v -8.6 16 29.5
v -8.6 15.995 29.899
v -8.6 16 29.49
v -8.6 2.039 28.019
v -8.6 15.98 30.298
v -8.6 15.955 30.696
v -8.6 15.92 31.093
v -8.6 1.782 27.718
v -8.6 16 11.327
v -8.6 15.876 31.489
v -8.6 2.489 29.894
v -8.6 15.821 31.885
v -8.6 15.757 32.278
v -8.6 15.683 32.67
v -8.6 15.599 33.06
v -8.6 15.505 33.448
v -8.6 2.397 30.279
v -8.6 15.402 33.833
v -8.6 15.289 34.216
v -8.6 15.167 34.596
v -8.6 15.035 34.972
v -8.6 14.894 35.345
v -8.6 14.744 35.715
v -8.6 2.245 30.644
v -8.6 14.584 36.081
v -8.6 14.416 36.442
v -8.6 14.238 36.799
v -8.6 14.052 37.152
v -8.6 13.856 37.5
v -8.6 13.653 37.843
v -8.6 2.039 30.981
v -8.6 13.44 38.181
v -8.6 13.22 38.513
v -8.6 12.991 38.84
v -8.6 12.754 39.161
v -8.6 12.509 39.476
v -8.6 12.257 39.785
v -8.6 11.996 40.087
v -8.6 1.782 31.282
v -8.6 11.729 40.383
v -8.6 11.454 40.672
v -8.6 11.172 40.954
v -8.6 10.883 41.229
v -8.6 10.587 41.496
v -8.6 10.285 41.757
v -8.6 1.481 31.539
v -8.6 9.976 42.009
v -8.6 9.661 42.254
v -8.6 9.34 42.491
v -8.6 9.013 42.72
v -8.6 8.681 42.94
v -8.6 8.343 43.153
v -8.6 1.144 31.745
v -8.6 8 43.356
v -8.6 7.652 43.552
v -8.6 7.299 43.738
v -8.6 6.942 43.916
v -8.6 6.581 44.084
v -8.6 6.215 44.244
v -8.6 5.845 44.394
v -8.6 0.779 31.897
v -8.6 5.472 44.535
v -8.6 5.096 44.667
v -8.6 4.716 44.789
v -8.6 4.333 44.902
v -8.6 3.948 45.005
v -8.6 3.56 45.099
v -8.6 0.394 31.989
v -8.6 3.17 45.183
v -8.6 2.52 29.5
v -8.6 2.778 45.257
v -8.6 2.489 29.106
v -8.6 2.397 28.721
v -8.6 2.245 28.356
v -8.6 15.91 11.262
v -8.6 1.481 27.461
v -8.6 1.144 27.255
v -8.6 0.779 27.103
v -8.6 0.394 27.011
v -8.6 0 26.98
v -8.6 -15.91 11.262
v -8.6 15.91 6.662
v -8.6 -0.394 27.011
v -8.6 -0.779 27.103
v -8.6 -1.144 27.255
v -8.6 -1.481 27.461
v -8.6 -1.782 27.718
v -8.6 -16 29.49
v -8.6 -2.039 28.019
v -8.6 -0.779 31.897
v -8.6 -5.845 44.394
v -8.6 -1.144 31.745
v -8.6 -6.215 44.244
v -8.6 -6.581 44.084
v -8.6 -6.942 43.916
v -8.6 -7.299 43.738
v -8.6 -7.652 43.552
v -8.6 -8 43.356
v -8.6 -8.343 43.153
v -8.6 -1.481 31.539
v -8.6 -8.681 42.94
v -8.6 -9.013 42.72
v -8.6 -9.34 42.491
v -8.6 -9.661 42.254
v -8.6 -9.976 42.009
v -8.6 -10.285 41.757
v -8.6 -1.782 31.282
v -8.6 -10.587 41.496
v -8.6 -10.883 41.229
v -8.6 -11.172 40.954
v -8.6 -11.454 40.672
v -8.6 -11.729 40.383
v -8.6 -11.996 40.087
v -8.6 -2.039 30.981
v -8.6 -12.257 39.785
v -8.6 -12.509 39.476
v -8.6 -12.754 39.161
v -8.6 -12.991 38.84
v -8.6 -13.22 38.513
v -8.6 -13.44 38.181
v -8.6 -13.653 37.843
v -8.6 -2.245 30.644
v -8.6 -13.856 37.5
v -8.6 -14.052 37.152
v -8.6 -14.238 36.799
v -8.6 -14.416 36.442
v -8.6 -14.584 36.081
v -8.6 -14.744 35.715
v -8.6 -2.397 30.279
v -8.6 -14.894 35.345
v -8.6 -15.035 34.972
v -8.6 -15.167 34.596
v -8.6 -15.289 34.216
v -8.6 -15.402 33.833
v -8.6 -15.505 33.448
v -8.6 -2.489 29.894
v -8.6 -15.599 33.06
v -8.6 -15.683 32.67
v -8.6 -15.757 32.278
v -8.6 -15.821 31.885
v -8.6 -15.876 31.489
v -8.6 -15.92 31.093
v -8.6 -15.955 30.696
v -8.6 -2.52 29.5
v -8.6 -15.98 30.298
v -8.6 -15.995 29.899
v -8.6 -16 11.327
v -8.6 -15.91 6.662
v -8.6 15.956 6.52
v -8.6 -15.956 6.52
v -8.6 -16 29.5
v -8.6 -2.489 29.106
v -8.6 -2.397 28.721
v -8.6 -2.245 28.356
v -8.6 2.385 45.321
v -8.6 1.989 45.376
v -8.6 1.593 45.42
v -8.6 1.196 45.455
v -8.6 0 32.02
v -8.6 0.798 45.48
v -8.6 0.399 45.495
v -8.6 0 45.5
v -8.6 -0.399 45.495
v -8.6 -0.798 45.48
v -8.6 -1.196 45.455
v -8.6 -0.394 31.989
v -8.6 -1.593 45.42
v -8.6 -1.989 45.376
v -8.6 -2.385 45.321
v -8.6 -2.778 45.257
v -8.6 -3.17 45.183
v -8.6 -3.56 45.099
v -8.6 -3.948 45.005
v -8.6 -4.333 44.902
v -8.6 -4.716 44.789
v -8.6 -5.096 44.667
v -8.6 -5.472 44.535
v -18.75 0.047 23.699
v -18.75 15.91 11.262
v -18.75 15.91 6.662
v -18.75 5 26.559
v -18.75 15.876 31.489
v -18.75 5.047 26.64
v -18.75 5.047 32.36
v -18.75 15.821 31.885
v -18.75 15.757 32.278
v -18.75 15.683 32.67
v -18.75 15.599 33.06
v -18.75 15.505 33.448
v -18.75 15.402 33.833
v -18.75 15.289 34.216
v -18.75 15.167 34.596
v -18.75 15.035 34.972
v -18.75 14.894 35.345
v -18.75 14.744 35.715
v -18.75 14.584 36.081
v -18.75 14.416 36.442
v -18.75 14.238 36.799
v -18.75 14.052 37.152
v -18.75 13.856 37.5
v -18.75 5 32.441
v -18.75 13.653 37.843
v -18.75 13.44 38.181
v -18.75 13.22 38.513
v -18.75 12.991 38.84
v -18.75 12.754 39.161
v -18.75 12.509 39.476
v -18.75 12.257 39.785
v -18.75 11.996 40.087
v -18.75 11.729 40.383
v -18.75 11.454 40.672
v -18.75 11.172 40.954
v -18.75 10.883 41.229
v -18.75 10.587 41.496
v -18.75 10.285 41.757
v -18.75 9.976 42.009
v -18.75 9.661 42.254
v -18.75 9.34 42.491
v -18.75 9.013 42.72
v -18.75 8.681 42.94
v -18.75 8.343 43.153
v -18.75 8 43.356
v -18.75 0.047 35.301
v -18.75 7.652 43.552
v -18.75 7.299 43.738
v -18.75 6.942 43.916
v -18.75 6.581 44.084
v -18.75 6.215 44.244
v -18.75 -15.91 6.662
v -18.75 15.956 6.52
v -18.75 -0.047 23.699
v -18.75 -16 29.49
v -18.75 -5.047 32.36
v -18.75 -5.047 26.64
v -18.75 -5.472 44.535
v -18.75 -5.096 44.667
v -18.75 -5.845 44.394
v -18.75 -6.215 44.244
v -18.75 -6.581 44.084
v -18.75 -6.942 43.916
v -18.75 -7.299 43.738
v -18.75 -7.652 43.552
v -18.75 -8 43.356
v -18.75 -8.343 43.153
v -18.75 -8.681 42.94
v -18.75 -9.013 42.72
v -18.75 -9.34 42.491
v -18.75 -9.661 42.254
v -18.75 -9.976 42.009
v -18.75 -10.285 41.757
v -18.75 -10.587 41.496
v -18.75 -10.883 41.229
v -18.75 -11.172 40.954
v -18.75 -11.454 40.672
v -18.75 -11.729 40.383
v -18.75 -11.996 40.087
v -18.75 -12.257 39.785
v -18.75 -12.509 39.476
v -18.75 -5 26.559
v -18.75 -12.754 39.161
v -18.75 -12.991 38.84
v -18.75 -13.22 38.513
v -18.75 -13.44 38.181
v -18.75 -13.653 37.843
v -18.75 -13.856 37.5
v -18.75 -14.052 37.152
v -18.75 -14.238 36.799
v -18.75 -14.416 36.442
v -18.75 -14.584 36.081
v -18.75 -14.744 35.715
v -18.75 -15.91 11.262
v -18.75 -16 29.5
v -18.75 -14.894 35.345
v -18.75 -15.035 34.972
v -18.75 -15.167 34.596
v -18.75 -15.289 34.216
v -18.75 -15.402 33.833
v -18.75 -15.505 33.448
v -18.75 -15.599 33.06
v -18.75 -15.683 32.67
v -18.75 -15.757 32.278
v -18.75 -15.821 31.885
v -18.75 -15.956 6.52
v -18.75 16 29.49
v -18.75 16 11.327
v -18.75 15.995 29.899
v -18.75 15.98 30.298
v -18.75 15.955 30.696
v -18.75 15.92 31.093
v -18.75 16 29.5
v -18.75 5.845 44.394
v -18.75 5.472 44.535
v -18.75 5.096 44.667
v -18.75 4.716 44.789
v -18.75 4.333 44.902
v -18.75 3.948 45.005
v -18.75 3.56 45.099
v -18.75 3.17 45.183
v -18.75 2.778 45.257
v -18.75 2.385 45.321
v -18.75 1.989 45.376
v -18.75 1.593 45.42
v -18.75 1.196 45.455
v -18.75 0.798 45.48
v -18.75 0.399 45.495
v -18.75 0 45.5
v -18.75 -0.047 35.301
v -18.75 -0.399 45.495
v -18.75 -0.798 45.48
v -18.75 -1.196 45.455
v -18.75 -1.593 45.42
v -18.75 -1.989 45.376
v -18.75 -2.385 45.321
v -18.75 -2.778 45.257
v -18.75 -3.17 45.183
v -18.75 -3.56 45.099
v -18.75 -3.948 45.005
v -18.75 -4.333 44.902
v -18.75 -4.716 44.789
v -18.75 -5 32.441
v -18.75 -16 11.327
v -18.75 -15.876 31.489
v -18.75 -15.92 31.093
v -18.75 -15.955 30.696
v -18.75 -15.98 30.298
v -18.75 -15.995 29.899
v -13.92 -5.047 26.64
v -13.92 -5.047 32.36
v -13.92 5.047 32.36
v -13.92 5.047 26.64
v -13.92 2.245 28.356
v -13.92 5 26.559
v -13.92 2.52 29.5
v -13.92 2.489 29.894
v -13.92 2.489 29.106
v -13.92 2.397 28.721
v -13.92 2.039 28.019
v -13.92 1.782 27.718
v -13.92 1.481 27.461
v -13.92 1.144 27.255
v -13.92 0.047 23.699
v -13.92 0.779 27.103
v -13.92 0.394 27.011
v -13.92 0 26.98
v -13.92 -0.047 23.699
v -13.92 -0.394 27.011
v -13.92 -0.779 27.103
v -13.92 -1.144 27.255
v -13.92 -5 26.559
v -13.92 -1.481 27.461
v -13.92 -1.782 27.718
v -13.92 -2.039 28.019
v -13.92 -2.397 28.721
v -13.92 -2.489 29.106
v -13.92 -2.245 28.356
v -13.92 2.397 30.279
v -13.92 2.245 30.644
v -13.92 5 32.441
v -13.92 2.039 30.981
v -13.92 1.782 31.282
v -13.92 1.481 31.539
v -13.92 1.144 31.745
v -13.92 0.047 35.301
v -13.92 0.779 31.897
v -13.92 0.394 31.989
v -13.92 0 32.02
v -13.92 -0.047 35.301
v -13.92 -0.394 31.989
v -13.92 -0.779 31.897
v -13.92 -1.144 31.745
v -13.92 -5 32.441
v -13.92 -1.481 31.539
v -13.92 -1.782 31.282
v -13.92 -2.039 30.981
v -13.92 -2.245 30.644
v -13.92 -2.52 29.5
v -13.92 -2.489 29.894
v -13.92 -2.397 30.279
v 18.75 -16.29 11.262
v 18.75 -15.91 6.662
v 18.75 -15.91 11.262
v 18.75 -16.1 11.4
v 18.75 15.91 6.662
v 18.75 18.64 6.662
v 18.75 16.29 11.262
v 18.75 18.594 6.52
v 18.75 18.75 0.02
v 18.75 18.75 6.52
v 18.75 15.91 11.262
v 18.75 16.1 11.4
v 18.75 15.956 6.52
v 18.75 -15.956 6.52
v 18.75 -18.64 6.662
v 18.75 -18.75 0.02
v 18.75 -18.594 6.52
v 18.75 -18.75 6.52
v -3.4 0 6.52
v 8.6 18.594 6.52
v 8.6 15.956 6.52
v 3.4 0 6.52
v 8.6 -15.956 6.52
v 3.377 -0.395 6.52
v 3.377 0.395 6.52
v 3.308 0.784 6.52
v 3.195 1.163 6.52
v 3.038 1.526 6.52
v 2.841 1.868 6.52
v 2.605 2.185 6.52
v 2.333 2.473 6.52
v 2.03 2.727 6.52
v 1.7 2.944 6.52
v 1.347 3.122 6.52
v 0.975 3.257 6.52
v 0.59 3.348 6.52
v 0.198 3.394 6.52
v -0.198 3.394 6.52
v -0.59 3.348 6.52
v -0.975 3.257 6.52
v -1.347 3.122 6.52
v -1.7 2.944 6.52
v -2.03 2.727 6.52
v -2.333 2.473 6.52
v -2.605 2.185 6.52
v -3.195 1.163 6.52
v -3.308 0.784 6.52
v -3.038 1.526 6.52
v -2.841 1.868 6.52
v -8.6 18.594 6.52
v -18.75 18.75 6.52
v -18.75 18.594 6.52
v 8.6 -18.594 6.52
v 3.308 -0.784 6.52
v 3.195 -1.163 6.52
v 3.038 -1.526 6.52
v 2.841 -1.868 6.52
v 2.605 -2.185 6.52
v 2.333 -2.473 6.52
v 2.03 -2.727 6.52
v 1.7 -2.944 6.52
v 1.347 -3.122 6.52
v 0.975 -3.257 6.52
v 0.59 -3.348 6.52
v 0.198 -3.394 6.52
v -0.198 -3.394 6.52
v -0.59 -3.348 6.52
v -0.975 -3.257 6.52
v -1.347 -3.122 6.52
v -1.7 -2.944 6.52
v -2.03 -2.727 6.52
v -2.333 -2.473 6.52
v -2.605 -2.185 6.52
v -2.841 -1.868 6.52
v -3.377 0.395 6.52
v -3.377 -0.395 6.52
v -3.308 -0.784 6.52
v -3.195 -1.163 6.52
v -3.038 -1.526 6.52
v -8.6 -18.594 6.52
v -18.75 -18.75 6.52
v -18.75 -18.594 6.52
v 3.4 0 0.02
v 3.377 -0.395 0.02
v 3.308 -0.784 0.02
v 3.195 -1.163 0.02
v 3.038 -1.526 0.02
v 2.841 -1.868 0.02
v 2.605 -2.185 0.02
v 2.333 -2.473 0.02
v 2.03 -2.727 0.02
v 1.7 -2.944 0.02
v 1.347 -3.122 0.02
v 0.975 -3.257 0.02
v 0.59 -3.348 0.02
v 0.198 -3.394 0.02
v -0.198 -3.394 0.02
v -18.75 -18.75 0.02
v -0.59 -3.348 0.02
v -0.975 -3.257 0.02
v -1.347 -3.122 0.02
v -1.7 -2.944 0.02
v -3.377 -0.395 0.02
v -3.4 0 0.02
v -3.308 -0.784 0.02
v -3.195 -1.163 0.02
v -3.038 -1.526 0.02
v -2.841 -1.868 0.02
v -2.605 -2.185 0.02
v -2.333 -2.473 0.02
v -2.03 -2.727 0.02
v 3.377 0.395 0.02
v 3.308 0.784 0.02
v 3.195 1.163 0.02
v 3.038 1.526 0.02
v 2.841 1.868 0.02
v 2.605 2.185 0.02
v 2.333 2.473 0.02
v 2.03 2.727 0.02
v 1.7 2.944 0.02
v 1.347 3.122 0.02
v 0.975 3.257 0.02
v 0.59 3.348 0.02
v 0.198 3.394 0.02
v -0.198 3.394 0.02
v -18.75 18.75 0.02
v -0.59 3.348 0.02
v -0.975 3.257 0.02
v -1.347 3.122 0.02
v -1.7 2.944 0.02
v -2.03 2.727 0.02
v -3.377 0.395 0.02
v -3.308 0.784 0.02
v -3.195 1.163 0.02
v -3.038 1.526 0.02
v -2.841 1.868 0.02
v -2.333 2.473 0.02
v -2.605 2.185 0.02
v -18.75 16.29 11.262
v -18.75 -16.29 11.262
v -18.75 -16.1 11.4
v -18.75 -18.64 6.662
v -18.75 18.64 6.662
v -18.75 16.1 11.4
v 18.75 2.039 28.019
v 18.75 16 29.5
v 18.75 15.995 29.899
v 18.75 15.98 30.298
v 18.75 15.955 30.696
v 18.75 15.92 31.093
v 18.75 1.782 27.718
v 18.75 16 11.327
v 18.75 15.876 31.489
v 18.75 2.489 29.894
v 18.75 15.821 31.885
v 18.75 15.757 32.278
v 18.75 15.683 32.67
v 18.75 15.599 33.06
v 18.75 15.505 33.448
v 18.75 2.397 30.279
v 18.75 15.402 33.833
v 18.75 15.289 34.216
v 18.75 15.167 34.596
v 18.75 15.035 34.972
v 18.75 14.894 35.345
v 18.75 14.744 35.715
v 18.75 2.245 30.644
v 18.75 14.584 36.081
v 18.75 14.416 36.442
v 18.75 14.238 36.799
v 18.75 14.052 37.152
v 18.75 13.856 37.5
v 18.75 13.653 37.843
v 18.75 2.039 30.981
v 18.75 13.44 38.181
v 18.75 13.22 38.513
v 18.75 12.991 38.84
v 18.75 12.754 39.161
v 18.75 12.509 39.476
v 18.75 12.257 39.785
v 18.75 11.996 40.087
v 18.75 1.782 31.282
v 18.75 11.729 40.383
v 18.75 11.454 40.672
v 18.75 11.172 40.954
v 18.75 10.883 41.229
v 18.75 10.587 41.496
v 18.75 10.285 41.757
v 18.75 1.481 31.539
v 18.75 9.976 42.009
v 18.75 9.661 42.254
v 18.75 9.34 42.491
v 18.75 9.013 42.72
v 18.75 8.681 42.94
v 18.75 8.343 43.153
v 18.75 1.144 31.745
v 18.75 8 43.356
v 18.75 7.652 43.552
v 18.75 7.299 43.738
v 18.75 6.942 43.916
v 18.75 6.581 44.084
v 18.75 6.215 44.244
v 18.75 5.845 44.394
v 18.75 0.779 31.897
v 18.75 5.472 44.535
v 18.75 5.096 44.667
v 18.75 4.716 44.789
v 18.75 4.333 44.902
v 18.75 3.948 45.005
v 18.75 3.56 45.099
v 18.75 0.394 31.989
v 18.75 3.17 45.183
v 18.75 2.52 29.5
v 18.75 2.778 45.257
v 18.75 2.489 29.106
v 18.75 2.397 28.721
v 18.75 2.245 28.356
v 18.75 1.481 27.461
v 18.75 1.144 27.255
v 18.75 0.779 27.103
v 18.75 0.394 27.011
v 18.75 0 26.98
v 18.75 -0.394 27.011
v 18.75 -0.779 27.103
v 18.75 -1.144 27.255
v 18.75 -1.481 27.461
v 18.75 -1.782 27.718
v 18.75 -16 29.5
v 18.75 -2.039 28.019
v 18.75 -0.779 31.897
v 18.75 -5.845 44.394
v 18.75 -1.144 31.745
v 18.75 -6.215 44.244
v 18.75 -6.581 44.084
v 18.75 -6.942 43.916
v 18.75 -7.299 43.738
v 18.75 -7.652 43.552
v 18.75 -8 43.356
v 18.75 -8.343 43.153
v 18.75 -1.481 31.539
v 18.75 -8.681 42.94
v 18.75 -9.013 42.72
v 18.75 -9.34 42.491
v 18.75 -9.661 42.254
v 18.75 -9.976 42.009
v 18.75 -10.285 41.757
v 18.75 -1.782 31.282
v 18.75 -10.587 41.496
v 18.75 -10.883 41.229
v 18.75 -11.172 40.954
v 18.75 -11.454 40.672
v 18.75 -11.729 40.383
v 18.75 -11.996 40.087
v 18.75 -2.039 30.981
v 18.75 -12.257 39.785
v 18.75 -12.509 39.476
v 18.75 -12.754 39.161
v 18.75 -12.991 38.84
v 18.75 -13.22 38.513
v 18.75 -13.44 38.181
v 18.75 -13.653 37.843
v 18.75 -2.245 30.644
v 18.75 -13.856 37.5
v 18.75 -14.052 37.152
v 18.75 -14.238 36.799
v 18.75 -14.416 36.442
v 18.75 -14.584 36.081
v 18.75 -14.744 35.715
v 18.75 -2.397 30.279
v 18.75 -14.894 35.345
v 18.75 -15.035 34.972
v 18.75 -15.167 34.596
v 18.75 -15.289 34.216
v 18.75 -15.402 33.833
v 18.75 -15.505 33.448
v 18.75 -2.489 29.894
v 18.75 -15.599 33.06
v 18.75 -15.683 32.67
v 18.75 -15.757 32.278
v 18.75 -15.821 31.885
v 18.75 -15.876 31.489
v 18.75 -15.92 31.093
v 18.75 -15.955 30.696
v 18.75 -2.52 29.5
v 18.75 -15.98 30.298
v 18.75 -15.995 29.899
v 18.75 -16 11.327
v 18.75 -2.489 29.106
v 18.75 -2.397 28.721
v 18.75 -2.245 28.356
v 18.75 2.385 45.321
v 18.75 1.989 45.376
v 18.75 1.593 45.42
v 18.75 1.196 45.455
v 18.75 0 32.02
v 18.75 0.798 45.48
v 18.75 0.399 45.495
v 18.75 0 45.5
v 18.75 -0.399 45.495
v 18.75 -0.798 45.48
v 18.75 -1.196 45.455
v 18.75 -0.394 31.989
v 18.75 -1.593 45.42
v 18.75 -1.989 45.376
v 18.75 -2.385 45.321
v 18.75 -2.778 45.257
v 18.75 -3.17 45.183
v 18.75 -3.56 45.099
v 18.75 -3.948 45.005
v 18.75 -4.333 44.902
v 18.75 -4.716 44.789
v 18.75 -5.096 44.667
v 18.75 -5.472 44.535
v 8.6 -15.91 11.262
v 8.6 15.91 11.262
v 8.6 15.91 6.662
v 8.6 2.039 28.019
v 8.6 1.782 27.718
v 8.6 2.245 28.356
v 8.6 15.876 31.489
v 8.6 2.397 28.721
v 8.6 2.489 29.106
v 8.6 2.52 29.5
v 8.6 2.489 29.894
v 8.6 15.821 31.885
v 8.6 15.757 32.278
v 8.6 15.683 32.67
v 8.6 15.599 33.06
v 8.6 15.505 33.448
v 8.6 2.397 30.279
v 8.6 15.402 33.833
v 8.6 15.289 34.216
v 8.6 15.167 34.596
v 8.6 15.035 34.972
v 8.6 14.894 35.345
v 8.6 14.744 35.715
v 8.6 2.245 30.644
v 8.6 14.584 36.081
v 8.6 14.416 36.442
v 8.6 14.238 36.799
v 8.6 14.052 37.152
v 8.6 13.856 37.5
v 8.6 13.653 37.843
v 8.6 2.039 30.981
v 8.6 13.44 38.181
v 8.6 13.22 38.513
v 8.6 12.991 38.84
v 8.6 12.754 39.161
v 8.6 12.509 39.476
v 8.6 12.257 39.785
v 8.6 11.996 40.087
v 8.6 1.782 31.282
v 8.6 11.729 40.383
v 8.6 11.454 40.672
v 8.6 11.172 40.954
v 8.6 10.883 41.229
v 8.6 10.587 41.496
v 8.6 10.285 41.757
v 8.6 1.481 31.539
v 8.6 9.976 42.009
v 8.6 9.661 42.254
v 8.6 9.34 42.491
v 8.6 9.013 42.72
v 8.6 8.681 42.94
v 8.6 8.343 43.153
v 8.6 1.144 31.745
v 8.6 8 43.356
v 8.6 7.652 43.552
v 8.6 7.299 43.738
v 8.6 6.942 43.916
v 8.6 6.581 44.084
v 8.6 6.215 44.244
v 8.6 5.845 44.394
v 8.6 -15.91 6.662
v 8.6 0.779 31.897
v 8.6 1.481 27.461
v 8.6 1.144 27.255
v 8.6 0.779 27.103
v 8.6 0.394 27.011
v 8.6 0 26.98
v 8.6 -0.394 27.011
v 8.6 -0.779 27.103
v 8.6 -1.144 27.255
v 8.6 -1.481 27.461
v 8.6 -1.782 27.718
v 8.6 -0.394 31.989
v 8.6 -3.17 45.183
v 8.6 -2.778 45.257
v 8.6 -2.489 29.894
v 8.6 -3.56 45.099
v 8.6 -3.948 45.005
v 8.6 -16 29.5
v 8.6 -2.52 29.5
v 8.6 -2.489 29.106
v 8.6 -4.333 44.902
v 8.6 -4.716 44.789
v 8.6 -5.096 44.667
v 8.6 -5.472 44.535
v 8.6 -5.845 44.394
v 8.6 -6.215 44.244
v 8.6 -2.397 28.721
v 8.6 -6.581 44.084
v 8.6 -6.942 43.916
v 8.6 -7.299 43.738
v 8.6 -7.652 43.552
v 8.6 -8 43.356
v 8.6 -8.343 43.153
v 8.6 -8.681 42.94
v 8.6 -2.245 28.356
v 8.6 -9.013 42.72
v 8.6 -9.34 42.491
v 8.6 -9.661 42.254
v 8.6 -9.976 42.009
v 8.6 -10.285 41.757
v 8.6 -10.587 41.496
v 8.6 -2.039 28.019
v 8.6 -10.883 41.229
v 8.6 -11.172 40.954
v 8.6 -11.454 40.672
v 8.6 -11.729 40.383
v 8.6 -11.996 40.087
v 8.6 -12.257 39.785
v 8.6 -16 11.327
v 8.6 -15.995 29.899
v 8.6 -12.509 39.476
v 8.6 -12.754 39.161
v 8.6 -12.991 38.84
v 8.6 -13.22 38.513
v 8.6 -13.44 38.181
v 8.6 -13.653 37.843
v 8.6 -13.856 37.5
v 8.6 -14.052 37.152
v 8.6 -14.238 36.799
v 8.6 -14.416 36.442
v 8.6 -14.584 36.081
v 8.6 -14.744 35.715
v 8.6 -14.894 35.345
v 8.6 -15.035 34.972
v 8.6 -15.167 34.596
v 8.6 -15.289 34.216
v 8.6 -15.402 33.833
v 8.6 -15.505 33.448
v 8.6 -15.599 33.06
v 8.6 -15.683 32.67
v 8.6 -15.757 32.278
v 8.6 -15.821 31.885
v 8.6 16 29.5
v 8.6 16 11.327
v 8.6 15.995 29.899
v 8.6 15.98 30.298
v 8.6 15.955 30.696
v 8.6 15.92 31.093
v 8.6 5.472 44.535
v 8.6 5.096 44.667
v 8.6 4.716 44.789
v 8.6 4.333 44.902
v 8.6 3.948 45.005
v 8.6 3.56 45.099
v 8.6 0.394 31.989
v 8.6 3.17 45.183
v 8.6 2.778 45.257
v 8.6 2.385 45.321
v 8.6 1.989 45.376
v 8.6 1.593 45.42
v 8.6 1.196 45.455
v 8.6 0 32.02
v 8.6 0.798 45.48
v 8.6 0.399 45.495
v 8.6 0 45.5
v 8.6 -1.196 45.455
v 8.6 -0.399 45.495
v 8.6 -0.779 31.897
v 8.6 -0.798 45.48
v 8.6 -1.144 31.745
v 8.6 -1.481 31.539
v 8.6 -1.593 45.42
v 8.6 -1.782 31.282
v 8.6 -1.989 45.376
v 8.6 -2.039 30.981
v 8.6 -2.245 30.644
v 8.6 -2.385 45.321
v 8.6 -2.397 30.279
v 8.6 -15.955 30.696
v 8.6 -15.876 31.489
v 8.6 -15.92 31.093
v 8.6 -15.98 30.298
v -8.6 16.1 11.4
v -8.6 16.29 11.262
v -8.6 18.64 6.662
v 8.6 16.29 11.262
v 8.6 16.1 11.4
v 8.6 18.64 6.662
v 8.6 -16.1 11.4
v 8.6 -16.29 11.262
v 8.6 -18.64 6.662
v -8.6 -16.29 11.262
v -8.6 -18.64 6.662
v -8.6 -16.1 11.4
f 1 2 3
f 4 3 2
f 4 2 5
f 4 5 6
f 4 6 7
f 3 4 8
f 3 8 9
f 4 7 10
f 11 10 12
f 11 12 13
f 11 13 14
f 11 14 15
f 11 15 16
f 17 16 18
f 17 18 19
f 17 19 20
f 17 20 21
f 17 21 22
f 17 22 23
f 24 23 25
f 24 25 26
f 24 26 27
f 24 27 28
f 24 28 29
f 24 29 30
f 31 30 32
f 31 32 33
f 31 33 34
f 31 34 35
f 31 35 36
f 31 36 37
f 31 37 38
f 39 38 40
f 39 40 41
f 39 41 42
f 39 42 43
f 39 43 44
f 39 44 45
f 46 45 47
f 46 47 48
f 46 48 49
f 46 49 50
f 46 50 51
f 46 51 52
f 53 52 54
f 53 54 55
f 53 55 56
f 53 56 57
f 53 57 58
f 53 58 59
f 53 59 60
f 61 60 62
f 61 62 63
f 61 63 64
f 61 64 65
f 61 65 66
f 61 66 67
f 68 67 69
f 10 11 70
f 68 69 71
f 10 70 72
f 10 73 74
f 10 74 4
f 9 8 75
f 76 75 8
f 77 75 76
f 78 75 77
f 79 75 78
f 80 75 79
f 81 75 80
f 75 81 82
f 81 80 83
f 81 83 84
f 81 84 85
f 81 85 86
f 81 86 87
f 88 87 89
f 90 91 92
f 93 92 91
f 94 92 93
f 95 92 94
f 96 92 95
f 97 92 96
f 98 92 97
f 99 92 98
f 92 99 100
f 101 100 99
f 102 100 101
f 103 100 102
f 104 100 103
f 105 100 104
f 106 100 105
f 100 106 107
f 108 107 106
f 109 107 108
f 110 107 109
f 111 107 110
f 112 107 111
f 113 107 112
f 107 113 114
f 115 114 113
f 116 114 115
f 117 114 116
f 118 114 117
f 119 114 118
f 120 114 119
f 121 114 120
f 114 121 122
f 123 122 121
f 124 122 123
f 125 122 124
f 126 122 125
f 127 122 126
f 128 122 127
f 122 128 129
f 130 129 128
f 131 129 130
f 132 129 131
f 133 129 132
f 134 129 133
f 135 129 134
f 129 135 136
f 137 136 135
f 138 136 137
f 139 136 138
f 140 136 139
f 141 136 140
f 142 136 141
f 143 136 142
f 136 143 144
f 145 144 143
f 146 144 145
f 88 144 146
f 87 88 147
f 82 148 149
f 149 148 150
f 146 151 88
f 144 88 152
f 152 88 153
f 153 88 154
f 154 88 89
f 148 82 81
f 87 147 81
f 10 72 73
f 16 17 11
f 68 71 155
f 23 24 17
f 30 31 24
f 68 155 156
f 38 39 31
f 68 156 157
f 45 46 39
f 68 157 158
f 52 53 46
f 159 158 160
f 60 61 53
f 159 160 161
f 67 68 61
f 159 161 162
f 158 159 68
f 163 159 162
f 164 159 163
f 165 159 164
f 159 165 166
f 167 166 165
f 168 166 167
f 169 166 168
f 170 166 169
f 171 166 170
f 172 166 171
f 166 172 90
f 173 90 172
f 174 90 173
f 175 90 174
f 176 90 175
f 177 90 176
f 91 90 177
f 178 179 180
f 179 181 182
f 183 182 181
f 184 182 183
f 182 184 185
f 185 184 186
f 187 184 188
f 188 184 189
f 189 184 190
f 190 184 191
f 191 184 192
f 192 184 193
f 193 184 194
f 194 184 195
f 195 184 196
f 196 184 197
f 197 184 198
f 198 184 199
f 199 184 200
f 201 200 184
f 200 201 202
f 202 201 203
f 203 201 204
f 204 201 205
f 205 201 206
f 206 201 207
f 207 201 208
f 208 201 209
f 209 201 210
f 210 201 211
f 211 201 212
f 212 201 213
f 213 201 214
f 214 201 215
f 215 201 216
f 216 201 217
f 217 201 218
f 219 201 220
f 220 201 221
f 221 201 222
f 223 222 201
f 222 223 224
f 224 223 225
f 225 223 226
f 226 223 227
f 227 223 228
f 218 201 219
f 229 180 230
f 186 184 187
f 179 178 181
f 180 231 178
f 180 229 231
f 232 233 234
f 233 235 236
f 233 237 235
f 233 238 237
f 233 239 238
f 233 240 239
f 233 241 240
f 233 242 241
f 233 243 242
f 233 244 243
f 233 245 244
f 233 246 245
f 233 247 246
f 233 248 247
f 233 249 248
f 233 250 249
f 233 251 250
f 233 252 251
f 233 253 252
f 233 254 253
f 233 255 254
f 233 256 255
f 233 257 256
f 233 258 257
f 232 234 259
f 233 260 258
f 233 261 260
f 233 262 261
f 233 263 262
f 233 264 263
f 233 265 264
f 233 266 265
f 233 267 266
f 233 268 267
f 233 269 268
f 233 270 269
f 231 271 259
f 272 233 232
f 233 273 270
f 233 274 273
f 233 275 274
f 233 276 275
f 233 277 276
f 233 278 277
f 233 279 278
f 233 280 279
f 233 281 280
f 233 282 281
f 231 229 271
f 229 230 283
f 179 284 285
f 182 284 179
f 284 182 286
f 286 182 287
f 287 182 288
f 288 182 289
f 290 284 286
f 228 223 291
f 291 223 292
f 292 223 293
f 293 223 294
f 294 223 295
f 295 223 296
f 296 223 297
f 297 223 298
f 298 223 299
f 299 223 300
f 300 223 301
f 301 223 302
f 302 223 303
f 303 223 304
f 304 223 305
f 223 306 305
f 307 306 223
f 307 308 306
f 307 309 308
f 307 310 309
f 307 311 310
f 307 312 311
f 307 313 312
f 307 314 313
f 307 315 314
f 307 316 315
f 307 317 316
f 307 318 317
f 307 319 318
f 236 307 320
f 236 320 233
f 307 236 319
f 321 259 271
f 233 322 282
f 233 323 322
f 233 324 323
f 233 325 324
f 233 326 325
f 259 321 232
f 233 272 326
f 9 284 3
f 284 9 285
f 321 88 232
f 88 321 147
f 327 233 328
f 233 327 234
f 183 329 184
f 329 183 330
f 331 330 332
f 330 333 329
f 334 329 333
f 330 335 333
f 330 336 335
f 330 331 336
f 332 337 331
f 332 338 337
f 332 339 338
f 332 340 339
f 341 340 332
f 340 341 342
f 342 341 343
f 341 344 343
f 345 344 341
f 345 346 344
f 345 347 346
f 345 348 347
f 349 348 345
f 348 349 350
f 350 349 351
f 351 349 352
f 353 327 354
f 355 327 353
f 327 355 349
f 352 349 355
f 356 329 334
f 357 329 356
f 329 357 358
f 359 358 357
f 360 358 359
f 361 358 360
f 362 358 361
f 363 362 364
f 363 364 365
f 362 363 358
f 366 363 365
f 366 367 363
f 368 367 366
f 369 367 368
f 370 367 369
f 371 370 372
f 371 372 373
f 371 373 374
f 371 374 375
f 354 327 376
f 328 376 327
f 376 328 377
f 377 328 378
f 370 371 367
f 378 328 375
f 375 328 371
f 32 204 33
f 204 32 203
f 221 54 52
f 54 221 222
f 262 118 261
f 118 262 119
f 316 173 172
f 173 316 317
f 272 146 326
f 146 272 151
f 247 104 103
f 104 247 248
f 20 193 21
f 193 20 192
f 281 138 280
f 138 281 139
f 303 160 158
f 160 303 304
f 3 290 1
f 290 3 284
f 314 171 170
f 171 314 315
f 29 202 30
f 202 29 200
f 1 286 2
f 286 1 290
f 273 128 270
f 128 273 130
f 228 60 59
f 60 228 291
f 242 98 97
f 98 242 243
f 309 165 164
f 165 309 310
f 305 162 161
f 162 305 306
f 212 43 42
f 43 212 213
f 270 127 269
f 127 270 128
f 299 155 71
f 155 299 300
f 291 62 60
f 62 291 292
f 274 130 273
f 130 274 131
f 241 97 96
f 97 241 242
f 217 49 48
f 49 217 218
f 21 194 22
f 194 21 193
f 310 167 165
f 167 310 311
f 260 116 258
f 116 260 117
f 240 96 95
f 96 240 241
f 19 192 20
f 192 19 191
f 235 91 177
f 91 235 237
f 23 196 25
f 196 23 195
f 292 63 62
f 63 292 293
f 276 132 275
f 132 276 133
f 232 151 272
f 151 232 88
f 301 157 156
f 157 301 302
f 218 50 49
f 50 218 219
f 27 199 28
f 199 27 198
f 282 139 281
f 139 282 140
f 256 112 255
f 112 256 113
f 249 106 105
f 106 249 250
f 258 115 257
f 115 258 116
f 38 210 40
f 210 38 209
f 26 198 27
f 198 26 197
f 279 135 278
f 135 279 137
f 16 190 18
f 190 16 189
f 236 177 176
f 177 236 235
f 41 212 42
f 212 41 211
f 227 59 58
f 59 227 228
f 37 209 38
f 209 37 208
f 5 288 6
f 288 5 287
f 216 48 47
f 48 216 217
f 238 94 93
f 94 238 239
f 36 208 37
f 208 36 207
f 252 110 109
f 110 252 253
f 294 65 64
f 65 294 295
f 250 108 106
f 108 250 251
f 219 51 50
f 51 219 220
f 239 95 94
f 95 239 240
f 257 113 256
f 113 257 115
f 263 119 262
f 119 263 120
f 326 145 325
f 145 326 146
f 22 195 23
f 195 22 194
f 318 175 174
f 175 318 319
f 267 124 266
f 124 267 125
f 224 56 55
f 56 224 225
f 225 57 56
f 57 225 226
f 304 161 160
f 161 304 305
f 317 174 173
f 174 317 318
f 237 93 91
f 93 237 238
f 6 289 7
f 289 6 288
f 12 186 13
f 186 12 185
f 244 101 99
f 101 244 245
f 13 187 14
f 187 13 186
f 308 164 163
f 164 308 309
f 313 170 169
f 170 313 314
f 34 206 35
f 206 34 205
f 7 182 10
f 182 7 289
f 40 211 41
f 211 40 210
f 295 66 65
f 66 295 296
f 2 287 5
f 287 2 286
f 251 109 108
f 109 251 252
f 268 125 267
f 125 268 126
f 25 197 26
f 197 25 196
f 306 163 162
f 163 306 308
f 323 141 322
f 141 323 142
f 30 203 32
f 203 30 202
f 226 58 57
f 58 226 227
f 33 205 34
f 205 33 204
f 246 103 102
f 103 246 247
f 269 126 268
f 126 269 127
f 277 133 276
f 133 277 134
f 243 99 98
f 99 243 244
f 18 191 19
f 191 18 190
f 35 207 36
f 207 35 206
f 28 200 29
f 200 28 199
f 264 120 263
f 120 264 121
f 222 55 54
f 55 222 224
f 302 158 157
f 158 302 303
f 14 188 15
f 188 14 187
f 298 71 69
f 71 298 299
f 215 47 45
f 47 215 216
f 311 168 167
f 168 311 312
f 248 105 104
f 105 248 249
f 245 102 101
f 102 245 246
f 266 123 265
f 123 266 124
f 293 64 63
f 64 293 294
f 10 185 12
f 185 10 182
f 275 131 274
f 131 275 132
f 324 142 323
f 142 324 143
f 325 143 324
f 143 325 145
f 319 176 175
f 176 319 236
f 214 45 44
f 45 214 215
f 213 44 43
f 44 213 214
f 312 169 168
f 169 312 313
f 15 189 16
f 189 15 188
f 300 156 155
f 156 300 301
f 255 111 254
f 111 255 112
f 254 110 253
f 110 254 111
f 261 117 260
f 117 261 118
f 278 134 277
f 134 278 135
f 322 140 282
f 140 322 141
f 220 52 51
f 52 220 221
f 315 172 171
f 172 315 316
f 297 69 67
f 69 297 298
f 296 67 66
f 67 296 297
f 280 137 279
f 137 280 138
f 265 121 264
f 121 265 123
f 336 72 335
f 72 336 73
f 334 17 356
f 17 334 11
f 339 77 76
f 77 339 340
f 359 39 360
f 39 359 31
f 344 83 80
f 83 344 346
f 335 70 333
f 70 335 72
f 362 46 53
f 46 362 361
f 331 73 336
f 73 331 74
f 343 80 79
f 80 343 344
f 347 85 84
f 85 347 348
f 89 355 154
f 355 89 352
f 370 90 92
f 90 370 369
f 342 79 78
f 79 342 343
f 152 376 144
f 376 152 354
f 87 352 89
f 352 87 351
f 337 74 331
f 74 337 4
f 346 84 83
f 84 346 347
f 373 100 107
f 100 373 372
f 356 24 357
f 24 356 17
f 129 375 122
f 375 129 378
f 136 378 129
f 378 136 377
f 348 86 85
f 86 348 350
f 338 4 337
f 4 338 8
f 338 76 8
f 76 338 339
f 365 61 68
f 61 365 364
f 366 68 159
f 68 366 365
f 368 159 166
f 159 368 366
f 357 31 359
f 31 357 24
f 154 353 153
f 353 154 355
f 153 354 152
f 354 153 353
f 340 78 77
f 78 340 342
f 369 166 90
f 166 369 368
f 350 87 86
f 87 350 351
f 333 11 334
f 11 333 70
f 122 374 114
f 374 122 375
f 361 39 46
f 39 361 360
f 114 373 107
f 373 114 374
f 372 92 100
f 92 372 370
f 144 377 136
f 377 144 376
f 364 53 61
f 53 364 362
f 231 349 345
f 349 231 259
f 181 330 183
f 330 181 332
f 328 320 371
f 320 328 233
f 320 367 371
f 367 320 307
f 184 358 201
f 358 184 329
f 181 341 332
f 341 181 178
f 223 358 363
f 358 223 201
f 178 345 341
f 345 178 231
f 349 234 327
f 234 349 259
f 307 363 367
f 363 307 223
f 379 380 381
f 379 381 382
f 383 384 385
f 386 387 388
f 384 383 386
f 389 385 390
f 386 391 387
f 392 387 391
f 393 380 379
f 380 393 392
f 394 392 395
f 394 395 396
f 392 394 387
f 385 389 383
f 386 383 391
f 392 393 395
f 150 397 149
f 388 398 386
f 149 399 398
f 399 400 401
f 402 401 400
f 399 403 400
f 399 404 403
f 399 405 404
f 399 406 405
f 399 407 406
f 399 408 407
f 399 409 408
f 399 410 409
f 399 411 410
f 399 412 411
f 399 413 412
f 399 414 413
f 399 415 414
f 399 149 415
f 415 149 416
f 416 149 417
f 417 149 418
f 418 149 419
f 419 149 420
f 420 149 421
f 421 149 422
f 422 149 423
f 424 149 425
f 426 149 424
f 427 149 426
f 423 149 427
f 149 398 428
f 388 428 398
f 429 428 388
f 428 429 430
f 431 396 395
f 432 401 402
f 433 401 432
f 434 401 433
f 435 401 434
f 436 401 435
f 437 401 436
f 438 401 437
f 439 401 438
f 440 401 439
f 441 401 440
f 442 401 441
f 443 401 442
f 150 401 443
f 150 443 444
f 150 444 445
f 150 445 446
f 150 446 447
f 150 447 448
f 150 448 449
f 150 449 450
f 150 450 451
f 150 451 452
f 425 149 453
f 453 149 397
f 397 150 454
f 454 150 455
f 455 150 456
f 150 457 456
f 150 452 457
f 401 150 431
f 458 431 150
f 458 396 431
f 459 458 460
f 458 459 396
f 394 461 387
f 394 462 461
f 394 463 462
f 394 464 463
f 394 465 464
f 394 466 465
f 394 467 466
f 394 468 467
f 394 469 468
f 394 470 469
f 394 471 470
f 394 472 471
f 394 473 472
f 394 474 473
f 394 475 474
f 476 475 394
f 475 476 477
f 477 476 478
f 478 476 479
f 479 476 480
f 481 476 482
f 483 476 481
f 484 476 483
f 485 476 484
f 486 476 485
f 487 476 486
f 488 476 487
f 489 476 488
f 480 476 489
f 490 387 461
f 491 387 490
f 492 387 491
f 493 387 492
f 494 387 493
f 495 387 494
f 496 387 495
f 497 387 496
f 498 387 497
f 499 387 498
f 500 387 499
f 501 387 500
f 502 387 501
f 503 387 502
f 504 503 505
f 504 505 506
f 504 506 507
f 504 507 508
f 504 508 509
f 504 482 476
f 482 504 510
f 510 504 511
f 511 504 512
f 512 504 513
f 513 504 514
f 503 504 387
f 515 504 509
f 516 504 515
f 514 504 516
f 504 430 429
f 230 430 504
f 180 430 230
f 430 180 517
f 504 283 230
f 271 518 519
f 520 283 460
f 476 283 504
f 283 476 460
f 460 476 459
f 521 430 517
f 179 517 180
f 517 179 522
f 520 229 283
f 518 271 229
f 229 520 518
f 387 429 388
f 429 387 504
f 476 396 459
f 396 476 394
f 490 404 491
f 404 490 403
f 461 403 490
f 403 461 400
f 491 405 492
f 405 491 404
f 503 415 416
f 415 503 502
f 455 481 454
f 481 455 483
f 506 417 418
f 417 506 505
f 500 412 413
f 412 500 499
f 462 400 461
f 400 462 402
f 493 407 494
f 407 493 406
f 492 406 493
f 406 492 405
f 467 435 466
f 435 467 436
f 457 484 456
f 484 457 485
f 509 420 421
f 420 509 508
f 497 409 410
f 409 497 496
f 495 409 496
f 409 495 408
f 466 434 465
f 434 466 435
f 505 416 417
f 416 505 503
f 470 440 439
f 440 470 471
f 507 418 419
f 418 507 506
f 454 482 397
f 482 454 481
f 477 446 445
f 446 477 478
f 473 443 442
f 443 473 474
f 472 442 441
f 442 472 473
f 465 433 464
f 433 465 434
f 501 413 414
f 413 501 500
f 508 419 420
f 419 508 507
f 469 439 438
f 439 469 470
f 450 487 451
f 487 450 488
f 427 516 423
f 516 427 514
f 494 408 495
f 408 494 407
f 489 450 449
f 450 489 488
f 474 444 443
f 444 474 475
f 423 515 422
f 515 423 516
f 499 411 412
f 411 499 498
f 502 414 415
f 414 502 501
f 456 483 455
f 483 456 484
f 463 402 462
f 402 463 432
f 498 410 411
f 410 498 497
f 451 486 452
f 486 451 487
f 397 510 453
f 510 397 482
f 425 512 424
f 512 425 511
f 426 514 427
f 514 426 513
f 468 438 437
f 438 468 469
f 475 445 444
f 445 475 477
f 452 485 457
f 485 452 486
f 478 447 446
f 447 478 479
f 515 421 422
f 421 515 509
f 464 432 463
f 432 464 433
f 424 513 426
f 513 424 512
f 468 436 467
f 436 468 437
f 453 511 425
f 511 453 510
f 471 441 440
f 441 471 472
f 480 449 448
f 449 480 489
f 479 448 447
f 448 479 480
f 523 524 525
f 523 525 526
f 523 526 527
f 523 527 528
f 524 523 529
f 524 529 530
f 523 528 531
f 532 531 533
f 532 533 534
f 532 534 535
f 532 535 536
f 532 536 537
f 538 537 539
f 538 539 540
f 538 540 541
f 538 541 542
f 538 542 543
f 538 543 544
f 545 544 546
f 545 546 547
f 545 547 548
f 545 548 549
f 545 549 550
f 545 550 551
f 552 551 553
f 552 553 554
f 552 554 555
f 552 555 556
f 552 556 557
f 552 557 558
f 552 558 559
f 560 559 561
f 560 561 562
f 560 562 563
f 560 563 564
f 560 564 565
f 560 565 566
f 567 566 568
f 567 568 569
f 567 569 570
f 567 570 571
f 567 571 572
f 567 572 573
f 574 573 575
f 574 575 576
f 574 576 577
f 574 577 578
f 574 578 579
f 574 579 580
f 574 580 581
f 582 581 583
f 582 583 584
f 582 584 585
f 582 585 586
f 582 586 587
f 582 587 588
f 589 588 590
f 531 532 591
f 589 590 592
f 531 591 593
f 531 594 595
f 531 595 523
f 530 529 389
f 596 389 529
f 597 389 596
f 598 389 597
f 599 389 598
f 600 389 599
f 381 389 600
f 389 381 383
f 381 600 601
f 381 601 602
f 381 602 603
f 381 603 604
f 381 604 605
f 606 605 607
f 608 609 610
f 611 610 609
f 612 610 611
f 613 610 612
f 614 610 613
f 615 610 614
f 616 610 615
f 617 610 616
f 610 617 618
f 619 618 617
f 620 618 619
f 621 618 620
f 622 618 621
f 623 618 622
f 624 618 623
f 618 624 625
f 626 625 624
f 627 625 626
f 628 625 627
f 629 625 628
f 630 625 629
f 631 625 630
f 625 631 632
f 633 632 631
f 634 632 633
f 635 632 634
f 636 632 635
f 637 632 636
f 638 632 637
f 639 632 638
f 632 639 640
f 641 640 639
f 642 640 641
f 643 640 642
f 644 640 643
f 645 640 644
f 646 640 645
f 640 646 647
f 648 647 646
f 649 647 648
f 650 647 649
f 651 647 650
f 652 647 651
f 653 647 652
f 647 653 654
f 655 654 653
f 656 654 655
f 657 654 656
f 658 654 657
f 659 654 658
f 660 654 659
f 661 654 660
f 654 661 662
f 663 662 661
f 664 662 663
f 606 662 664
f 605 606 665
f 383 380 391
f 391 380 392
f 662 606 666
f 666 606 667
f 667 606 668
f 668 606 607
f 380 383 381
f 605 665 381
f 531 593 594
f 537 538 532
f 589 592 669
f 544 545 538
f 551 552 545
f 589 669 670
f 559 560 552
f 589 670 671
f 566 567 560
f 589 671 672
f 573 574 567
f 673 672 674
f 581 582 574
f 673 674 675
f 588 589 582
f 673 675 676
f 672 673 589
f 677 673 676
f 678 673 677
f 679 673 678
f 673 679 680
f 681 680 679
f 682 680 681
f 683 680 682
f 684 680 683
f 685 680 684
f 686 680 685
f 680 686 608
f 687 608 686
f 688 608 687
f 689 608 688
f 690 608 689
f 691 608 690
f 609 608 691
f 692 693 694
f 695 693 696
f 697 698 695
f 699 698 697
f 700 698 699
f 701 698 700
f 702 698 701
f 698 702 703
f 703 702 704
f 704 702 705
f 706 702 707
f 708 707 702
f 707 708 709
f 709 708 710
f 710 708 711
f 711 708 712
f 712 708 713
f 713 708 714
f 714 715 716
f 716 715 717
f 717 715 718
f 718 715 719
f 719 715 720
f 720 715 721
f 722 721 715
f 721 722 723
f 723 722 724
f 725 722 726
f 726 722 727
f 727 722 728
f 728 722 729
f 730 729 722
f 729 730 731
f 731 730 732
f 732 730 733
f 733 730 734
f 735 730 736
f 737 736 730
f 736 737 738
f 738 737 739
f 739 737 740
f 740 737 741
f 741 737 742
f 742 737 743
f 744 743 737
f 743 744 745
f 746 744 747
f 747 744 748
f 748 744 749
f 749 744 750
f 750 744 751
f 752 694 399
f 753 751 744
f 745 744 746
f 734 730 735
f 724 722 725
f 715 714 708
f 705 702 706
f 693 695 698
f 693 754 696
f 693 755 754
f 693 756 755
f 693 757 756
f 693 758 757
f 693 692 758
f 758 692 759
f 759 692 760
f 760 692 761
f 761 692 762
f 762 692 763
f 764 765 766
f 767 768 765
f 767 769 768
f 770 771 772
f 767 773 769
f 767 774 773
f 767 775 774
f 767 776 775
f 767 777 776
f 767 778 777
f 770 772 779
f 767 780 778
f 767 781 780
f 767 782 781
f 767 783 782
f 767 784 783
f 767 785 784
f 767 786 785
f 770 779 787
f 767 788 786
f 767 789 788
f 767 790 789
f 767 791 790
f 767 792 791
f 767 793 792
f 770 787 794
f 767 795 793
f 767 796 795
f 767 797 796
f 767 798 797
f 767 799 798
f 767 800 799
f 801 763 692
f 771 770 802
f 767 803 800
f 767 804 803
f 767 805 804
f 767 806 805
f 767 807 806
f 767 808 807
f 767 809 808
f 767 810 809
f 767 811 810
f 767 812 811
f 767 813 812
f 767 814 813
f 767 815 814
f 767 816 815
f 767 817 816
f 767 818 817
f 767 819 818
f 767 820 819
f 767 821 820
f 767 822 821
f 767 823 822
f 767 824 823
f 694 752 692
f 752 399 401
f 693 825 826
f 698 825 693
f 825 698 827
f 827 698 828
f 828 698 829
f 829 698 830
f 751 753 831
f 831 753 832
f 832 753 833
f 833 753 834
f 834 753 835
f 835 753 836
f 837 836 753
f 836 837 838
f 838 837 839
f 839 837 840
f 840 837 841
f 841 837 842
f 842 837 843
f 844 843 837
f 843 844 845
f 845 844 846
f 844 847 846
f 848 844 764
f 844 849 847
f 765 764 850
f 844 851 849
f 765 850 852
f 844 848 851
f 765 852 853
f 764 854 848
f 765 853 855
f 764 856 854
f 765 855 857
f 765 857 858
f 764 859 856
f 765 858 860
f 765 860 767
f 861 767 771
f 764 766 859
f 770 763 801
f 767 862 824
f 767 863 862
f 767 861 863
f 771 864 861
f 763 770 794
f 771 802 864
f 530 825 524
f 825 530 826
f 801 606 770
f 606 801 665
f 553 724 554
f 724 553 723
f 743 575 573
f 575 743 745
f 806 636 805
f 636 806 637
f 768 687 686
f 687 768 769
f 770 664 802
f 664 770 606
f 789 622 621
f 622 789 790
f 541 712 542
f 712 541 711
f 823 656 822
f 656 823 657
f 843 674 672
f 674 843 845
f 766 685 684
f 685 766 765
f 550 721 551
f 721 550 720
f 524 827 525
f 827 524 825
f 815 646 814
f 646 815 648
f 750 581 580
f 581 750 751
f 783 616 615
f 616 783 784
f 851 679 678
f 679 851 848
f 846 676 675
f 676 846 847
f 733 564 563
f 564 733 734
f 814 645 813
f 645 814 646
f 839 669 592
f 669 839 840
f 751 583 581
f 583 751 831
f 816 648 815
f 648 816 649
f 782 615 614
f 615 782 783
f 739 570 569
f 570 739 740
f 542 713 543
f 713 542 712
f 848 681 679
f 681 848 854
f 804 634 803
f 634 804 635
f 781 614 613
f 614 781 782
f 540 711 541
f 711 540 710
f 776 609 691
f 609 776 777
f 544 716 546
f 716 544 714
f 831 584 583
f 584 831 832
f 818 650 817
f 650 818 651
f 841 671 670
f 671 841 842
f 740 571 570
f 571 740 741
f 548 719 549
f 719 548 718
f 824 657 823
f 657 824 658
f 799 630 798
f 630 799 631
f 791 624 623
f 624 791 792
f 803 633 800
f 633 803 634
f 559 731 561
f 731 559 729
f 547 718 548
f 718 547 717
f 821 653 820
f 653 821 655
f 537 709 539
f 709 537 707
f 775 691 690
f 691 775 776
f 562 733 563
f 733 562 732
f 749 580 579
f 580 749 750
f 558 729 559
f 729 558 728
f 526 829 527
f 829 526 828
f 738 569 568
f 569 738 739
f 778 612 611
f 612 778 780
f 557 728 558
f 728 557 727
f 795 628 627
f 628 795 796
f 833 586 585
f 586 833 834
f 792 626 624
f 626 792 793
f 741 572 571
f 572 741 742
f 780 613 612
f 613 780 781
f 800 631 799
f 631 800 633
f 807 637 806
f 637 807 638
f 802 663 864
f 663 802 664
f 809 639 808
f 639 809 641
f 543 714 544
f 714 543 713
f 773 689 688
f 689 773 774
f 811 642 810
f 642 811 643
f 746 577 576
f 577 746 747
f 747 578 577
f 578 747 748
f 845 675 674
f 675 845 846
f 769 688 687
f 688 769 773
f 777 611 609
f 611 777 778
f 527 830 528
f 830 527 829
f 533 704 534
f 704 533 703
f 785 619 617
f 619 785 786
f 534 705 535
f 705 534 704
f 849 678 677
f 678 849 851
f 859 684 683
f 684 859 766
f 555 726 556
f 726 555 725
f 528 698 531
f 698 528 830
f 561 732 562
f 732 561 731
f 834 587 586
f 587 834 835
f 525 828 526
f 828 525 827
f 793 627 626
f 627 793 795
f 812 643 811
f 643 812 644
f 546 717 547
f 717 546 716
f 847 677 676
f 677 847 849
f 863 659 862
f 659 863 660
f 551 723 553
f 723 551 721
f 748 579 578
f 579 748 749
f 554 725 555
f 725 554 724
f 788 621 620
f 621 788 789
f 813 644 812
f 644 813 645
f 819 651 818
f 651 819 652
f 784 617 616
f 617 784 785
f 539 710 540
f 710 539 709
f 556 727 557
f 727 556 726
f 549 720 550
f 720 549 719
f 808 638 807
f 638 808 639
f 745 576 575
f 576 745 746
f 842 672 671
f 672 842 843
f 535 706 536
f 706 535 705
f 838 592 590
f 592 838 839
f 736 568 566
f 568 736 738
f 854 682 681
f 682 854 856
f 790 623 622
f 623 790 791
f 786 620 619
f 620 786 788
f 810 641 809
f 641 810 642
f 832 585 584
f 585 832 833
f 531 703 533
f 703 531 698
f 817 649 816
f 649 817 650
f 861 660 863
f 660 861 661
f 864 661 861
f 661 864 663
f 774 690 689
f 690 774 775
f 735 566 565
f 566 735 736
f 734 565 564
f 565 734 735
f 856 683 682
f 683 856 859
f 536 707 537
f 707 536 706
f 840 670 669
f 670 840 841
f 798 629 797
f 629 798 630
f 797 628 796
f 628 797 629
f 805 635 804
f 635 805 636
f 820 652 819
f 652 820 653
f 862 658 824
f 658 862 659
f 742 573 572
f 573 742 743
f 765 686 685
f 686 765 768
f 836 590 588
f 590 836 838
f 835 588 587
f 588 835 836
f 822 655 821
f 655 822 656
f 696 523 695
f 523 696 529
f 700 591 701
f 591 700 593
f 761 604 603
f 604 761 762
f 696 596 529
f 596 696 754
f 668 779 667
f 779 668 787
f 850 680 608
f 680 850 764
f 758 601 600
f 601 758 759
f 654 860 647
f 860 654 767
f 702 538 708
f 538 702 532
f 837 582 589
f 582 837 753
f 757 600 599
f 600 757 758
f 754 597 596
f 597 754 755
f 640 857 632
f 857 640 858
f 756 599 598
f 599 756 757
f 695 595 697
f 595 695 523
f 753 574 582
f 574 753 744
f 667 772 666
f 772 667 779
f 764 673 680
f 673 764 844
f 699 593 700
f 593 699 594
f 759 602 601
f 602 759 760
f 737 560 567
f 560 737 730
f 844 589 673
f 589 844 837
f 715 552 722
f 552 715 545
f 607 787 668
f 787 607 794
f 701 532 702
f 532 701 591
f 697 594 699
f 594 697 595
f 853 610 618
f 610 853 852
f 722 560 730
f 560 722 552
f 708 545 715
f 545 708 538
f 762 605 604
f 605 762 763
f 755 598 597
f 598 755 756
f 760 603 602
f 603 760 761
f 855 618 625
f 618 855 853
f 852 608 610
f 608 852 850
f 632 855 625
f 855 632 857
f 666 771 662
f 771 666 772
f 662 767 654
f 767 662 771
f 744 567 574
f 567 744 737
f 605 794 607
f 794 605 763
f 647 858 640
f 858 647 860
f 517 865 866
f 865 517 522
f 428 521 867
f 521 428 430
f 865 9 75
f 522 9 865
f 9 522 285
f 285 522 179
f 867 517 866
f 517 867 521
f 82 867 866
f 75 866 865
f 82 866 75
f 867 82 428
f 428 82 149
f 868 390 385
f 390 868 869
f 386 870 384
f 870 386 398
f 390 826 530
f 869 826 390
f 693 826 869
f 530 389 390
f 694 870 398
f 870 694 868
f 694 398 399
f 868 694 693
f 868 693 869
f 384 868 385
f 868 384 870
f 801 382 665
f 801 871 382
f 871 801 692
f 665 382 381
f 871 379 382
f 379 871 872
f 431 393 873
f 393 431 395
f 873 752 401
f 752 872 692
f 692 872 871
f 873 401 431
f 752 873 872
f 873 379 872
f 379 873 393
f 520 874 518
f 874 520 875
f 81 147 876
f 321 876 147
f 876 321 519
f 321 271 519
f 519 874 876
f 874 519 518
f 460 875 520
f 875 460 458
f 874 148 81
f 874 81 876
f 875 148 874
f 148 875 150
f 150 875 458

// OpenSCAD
$fa = 1;
$fs = 0.4;

module phex(wid,rad,height){
hull(){
translate([wid/2-rad,0,0])cylinder(r=rad,h=height);
rotate([0,0,60])translate([wid/2-rad,0,0])cylinder(r=rad,h=height);
rotate([0,0,120])translate([wid/2-rad,0,0])cylinder(r=rad,h=height);
rotate([0,0,180])translate([wid/2-rad,0,0])cylinder(r=rad,h=height);
rotate([0,0,240])translate([wid/2-rad,0,0])cylinder(r=rad,h=height);
rotate([0,0,300])translate([wid/2-rad,0,0])cylinder(r=rad,h=height);

}
}

module fhex(wid,height){
hull(){
cube([wid/1.7,wid,height],center = true);
rotate([0,0,120])cube([wid/1.7,wid,height],center = true);
rotate([0,0,240])cube([wid/1.7,wid,height],center = true);
}
}







module right_triangle(side1,side2,corner_radius,triangle_height){
  translate([corner_radius,corner_radius,0]){  
    hull(){  
    cylinder(r=corner_radius,h=triangle_height);
      translate([side1 - corner_radius * 2,0,0])cylinder(r=corner_radius,h=triangle_height);
          translate([0,side2 - corner_radius * 2,0])cylinder(r=corner_radius,h=triangle_height);  
    }
  }
    
}



translate([-(18.75-10.15/2),0,23/2+6.5-0.01])
difference(){
cube([10.15,32,23],center=true);

translate([0,0,23/2])
rotate([0,90,0])
cylinder(h=11+0.001,r=5.04/2,center=true);

translate([-2.75,0,23/2])
rotate([0,90,0])
fhex(10,5+0.01);
}



translate([-(18.75-10.15/2),0,23+6.5])
rotate([0,90,0])
difference(){
cylinder(h=10.15,r=16,center=true);
cylinder(h=10.15+0.001,r=5.04/2,center=true);

translate([0,0,-2.75])
rotate([0,0,0])
fhex(10,5+0.01);

}

translate([0,0,6.5/2+0.02])
difference(){
color([1,0,0])cube([37.5,37.5,6.5],center=true);
cylinder(h=6.6,r=6.8/2,center=true);
}

translate([18.75-10.15/2,0,23/2+6.5])
difference(){
cube([10.15,32,23],center=true);

translate([0,0,23/2])
rotate([0,90,0])
    cylinder(h=11+0.001,r=5.04/2,center=true);
}



translate([(18.75-10.15/2),0,23+6.5])
rotate([0,90,0])

difference(){
cylinder(h=10.15,r=16,center=true);
cylinder(h=10.15+0.001,r=5.04/2,center=true);
}


translate([-8.6,15.9,6.4])
rotate([0,-90,0])
color([1,1,1])right_triangle(5,2.75,0.2,10.15);


translate([10.15+8.6,15.9,6.4])
rotate([0,-90,0])
color([1,1,1])right_triangle(5,2.75,0.2,10.15);

translate([8.6,-15.9,6.4])
rotate([90,-90,-270])
color([1,1,1])right_triangle(5,2.75,0.2,10.15);

translate([-10.15-8.6,-15.9,6.4])
rotate([90,-90,-270])
color([1,1,1])right_triangle(5,2.75,0.2,10.15);
